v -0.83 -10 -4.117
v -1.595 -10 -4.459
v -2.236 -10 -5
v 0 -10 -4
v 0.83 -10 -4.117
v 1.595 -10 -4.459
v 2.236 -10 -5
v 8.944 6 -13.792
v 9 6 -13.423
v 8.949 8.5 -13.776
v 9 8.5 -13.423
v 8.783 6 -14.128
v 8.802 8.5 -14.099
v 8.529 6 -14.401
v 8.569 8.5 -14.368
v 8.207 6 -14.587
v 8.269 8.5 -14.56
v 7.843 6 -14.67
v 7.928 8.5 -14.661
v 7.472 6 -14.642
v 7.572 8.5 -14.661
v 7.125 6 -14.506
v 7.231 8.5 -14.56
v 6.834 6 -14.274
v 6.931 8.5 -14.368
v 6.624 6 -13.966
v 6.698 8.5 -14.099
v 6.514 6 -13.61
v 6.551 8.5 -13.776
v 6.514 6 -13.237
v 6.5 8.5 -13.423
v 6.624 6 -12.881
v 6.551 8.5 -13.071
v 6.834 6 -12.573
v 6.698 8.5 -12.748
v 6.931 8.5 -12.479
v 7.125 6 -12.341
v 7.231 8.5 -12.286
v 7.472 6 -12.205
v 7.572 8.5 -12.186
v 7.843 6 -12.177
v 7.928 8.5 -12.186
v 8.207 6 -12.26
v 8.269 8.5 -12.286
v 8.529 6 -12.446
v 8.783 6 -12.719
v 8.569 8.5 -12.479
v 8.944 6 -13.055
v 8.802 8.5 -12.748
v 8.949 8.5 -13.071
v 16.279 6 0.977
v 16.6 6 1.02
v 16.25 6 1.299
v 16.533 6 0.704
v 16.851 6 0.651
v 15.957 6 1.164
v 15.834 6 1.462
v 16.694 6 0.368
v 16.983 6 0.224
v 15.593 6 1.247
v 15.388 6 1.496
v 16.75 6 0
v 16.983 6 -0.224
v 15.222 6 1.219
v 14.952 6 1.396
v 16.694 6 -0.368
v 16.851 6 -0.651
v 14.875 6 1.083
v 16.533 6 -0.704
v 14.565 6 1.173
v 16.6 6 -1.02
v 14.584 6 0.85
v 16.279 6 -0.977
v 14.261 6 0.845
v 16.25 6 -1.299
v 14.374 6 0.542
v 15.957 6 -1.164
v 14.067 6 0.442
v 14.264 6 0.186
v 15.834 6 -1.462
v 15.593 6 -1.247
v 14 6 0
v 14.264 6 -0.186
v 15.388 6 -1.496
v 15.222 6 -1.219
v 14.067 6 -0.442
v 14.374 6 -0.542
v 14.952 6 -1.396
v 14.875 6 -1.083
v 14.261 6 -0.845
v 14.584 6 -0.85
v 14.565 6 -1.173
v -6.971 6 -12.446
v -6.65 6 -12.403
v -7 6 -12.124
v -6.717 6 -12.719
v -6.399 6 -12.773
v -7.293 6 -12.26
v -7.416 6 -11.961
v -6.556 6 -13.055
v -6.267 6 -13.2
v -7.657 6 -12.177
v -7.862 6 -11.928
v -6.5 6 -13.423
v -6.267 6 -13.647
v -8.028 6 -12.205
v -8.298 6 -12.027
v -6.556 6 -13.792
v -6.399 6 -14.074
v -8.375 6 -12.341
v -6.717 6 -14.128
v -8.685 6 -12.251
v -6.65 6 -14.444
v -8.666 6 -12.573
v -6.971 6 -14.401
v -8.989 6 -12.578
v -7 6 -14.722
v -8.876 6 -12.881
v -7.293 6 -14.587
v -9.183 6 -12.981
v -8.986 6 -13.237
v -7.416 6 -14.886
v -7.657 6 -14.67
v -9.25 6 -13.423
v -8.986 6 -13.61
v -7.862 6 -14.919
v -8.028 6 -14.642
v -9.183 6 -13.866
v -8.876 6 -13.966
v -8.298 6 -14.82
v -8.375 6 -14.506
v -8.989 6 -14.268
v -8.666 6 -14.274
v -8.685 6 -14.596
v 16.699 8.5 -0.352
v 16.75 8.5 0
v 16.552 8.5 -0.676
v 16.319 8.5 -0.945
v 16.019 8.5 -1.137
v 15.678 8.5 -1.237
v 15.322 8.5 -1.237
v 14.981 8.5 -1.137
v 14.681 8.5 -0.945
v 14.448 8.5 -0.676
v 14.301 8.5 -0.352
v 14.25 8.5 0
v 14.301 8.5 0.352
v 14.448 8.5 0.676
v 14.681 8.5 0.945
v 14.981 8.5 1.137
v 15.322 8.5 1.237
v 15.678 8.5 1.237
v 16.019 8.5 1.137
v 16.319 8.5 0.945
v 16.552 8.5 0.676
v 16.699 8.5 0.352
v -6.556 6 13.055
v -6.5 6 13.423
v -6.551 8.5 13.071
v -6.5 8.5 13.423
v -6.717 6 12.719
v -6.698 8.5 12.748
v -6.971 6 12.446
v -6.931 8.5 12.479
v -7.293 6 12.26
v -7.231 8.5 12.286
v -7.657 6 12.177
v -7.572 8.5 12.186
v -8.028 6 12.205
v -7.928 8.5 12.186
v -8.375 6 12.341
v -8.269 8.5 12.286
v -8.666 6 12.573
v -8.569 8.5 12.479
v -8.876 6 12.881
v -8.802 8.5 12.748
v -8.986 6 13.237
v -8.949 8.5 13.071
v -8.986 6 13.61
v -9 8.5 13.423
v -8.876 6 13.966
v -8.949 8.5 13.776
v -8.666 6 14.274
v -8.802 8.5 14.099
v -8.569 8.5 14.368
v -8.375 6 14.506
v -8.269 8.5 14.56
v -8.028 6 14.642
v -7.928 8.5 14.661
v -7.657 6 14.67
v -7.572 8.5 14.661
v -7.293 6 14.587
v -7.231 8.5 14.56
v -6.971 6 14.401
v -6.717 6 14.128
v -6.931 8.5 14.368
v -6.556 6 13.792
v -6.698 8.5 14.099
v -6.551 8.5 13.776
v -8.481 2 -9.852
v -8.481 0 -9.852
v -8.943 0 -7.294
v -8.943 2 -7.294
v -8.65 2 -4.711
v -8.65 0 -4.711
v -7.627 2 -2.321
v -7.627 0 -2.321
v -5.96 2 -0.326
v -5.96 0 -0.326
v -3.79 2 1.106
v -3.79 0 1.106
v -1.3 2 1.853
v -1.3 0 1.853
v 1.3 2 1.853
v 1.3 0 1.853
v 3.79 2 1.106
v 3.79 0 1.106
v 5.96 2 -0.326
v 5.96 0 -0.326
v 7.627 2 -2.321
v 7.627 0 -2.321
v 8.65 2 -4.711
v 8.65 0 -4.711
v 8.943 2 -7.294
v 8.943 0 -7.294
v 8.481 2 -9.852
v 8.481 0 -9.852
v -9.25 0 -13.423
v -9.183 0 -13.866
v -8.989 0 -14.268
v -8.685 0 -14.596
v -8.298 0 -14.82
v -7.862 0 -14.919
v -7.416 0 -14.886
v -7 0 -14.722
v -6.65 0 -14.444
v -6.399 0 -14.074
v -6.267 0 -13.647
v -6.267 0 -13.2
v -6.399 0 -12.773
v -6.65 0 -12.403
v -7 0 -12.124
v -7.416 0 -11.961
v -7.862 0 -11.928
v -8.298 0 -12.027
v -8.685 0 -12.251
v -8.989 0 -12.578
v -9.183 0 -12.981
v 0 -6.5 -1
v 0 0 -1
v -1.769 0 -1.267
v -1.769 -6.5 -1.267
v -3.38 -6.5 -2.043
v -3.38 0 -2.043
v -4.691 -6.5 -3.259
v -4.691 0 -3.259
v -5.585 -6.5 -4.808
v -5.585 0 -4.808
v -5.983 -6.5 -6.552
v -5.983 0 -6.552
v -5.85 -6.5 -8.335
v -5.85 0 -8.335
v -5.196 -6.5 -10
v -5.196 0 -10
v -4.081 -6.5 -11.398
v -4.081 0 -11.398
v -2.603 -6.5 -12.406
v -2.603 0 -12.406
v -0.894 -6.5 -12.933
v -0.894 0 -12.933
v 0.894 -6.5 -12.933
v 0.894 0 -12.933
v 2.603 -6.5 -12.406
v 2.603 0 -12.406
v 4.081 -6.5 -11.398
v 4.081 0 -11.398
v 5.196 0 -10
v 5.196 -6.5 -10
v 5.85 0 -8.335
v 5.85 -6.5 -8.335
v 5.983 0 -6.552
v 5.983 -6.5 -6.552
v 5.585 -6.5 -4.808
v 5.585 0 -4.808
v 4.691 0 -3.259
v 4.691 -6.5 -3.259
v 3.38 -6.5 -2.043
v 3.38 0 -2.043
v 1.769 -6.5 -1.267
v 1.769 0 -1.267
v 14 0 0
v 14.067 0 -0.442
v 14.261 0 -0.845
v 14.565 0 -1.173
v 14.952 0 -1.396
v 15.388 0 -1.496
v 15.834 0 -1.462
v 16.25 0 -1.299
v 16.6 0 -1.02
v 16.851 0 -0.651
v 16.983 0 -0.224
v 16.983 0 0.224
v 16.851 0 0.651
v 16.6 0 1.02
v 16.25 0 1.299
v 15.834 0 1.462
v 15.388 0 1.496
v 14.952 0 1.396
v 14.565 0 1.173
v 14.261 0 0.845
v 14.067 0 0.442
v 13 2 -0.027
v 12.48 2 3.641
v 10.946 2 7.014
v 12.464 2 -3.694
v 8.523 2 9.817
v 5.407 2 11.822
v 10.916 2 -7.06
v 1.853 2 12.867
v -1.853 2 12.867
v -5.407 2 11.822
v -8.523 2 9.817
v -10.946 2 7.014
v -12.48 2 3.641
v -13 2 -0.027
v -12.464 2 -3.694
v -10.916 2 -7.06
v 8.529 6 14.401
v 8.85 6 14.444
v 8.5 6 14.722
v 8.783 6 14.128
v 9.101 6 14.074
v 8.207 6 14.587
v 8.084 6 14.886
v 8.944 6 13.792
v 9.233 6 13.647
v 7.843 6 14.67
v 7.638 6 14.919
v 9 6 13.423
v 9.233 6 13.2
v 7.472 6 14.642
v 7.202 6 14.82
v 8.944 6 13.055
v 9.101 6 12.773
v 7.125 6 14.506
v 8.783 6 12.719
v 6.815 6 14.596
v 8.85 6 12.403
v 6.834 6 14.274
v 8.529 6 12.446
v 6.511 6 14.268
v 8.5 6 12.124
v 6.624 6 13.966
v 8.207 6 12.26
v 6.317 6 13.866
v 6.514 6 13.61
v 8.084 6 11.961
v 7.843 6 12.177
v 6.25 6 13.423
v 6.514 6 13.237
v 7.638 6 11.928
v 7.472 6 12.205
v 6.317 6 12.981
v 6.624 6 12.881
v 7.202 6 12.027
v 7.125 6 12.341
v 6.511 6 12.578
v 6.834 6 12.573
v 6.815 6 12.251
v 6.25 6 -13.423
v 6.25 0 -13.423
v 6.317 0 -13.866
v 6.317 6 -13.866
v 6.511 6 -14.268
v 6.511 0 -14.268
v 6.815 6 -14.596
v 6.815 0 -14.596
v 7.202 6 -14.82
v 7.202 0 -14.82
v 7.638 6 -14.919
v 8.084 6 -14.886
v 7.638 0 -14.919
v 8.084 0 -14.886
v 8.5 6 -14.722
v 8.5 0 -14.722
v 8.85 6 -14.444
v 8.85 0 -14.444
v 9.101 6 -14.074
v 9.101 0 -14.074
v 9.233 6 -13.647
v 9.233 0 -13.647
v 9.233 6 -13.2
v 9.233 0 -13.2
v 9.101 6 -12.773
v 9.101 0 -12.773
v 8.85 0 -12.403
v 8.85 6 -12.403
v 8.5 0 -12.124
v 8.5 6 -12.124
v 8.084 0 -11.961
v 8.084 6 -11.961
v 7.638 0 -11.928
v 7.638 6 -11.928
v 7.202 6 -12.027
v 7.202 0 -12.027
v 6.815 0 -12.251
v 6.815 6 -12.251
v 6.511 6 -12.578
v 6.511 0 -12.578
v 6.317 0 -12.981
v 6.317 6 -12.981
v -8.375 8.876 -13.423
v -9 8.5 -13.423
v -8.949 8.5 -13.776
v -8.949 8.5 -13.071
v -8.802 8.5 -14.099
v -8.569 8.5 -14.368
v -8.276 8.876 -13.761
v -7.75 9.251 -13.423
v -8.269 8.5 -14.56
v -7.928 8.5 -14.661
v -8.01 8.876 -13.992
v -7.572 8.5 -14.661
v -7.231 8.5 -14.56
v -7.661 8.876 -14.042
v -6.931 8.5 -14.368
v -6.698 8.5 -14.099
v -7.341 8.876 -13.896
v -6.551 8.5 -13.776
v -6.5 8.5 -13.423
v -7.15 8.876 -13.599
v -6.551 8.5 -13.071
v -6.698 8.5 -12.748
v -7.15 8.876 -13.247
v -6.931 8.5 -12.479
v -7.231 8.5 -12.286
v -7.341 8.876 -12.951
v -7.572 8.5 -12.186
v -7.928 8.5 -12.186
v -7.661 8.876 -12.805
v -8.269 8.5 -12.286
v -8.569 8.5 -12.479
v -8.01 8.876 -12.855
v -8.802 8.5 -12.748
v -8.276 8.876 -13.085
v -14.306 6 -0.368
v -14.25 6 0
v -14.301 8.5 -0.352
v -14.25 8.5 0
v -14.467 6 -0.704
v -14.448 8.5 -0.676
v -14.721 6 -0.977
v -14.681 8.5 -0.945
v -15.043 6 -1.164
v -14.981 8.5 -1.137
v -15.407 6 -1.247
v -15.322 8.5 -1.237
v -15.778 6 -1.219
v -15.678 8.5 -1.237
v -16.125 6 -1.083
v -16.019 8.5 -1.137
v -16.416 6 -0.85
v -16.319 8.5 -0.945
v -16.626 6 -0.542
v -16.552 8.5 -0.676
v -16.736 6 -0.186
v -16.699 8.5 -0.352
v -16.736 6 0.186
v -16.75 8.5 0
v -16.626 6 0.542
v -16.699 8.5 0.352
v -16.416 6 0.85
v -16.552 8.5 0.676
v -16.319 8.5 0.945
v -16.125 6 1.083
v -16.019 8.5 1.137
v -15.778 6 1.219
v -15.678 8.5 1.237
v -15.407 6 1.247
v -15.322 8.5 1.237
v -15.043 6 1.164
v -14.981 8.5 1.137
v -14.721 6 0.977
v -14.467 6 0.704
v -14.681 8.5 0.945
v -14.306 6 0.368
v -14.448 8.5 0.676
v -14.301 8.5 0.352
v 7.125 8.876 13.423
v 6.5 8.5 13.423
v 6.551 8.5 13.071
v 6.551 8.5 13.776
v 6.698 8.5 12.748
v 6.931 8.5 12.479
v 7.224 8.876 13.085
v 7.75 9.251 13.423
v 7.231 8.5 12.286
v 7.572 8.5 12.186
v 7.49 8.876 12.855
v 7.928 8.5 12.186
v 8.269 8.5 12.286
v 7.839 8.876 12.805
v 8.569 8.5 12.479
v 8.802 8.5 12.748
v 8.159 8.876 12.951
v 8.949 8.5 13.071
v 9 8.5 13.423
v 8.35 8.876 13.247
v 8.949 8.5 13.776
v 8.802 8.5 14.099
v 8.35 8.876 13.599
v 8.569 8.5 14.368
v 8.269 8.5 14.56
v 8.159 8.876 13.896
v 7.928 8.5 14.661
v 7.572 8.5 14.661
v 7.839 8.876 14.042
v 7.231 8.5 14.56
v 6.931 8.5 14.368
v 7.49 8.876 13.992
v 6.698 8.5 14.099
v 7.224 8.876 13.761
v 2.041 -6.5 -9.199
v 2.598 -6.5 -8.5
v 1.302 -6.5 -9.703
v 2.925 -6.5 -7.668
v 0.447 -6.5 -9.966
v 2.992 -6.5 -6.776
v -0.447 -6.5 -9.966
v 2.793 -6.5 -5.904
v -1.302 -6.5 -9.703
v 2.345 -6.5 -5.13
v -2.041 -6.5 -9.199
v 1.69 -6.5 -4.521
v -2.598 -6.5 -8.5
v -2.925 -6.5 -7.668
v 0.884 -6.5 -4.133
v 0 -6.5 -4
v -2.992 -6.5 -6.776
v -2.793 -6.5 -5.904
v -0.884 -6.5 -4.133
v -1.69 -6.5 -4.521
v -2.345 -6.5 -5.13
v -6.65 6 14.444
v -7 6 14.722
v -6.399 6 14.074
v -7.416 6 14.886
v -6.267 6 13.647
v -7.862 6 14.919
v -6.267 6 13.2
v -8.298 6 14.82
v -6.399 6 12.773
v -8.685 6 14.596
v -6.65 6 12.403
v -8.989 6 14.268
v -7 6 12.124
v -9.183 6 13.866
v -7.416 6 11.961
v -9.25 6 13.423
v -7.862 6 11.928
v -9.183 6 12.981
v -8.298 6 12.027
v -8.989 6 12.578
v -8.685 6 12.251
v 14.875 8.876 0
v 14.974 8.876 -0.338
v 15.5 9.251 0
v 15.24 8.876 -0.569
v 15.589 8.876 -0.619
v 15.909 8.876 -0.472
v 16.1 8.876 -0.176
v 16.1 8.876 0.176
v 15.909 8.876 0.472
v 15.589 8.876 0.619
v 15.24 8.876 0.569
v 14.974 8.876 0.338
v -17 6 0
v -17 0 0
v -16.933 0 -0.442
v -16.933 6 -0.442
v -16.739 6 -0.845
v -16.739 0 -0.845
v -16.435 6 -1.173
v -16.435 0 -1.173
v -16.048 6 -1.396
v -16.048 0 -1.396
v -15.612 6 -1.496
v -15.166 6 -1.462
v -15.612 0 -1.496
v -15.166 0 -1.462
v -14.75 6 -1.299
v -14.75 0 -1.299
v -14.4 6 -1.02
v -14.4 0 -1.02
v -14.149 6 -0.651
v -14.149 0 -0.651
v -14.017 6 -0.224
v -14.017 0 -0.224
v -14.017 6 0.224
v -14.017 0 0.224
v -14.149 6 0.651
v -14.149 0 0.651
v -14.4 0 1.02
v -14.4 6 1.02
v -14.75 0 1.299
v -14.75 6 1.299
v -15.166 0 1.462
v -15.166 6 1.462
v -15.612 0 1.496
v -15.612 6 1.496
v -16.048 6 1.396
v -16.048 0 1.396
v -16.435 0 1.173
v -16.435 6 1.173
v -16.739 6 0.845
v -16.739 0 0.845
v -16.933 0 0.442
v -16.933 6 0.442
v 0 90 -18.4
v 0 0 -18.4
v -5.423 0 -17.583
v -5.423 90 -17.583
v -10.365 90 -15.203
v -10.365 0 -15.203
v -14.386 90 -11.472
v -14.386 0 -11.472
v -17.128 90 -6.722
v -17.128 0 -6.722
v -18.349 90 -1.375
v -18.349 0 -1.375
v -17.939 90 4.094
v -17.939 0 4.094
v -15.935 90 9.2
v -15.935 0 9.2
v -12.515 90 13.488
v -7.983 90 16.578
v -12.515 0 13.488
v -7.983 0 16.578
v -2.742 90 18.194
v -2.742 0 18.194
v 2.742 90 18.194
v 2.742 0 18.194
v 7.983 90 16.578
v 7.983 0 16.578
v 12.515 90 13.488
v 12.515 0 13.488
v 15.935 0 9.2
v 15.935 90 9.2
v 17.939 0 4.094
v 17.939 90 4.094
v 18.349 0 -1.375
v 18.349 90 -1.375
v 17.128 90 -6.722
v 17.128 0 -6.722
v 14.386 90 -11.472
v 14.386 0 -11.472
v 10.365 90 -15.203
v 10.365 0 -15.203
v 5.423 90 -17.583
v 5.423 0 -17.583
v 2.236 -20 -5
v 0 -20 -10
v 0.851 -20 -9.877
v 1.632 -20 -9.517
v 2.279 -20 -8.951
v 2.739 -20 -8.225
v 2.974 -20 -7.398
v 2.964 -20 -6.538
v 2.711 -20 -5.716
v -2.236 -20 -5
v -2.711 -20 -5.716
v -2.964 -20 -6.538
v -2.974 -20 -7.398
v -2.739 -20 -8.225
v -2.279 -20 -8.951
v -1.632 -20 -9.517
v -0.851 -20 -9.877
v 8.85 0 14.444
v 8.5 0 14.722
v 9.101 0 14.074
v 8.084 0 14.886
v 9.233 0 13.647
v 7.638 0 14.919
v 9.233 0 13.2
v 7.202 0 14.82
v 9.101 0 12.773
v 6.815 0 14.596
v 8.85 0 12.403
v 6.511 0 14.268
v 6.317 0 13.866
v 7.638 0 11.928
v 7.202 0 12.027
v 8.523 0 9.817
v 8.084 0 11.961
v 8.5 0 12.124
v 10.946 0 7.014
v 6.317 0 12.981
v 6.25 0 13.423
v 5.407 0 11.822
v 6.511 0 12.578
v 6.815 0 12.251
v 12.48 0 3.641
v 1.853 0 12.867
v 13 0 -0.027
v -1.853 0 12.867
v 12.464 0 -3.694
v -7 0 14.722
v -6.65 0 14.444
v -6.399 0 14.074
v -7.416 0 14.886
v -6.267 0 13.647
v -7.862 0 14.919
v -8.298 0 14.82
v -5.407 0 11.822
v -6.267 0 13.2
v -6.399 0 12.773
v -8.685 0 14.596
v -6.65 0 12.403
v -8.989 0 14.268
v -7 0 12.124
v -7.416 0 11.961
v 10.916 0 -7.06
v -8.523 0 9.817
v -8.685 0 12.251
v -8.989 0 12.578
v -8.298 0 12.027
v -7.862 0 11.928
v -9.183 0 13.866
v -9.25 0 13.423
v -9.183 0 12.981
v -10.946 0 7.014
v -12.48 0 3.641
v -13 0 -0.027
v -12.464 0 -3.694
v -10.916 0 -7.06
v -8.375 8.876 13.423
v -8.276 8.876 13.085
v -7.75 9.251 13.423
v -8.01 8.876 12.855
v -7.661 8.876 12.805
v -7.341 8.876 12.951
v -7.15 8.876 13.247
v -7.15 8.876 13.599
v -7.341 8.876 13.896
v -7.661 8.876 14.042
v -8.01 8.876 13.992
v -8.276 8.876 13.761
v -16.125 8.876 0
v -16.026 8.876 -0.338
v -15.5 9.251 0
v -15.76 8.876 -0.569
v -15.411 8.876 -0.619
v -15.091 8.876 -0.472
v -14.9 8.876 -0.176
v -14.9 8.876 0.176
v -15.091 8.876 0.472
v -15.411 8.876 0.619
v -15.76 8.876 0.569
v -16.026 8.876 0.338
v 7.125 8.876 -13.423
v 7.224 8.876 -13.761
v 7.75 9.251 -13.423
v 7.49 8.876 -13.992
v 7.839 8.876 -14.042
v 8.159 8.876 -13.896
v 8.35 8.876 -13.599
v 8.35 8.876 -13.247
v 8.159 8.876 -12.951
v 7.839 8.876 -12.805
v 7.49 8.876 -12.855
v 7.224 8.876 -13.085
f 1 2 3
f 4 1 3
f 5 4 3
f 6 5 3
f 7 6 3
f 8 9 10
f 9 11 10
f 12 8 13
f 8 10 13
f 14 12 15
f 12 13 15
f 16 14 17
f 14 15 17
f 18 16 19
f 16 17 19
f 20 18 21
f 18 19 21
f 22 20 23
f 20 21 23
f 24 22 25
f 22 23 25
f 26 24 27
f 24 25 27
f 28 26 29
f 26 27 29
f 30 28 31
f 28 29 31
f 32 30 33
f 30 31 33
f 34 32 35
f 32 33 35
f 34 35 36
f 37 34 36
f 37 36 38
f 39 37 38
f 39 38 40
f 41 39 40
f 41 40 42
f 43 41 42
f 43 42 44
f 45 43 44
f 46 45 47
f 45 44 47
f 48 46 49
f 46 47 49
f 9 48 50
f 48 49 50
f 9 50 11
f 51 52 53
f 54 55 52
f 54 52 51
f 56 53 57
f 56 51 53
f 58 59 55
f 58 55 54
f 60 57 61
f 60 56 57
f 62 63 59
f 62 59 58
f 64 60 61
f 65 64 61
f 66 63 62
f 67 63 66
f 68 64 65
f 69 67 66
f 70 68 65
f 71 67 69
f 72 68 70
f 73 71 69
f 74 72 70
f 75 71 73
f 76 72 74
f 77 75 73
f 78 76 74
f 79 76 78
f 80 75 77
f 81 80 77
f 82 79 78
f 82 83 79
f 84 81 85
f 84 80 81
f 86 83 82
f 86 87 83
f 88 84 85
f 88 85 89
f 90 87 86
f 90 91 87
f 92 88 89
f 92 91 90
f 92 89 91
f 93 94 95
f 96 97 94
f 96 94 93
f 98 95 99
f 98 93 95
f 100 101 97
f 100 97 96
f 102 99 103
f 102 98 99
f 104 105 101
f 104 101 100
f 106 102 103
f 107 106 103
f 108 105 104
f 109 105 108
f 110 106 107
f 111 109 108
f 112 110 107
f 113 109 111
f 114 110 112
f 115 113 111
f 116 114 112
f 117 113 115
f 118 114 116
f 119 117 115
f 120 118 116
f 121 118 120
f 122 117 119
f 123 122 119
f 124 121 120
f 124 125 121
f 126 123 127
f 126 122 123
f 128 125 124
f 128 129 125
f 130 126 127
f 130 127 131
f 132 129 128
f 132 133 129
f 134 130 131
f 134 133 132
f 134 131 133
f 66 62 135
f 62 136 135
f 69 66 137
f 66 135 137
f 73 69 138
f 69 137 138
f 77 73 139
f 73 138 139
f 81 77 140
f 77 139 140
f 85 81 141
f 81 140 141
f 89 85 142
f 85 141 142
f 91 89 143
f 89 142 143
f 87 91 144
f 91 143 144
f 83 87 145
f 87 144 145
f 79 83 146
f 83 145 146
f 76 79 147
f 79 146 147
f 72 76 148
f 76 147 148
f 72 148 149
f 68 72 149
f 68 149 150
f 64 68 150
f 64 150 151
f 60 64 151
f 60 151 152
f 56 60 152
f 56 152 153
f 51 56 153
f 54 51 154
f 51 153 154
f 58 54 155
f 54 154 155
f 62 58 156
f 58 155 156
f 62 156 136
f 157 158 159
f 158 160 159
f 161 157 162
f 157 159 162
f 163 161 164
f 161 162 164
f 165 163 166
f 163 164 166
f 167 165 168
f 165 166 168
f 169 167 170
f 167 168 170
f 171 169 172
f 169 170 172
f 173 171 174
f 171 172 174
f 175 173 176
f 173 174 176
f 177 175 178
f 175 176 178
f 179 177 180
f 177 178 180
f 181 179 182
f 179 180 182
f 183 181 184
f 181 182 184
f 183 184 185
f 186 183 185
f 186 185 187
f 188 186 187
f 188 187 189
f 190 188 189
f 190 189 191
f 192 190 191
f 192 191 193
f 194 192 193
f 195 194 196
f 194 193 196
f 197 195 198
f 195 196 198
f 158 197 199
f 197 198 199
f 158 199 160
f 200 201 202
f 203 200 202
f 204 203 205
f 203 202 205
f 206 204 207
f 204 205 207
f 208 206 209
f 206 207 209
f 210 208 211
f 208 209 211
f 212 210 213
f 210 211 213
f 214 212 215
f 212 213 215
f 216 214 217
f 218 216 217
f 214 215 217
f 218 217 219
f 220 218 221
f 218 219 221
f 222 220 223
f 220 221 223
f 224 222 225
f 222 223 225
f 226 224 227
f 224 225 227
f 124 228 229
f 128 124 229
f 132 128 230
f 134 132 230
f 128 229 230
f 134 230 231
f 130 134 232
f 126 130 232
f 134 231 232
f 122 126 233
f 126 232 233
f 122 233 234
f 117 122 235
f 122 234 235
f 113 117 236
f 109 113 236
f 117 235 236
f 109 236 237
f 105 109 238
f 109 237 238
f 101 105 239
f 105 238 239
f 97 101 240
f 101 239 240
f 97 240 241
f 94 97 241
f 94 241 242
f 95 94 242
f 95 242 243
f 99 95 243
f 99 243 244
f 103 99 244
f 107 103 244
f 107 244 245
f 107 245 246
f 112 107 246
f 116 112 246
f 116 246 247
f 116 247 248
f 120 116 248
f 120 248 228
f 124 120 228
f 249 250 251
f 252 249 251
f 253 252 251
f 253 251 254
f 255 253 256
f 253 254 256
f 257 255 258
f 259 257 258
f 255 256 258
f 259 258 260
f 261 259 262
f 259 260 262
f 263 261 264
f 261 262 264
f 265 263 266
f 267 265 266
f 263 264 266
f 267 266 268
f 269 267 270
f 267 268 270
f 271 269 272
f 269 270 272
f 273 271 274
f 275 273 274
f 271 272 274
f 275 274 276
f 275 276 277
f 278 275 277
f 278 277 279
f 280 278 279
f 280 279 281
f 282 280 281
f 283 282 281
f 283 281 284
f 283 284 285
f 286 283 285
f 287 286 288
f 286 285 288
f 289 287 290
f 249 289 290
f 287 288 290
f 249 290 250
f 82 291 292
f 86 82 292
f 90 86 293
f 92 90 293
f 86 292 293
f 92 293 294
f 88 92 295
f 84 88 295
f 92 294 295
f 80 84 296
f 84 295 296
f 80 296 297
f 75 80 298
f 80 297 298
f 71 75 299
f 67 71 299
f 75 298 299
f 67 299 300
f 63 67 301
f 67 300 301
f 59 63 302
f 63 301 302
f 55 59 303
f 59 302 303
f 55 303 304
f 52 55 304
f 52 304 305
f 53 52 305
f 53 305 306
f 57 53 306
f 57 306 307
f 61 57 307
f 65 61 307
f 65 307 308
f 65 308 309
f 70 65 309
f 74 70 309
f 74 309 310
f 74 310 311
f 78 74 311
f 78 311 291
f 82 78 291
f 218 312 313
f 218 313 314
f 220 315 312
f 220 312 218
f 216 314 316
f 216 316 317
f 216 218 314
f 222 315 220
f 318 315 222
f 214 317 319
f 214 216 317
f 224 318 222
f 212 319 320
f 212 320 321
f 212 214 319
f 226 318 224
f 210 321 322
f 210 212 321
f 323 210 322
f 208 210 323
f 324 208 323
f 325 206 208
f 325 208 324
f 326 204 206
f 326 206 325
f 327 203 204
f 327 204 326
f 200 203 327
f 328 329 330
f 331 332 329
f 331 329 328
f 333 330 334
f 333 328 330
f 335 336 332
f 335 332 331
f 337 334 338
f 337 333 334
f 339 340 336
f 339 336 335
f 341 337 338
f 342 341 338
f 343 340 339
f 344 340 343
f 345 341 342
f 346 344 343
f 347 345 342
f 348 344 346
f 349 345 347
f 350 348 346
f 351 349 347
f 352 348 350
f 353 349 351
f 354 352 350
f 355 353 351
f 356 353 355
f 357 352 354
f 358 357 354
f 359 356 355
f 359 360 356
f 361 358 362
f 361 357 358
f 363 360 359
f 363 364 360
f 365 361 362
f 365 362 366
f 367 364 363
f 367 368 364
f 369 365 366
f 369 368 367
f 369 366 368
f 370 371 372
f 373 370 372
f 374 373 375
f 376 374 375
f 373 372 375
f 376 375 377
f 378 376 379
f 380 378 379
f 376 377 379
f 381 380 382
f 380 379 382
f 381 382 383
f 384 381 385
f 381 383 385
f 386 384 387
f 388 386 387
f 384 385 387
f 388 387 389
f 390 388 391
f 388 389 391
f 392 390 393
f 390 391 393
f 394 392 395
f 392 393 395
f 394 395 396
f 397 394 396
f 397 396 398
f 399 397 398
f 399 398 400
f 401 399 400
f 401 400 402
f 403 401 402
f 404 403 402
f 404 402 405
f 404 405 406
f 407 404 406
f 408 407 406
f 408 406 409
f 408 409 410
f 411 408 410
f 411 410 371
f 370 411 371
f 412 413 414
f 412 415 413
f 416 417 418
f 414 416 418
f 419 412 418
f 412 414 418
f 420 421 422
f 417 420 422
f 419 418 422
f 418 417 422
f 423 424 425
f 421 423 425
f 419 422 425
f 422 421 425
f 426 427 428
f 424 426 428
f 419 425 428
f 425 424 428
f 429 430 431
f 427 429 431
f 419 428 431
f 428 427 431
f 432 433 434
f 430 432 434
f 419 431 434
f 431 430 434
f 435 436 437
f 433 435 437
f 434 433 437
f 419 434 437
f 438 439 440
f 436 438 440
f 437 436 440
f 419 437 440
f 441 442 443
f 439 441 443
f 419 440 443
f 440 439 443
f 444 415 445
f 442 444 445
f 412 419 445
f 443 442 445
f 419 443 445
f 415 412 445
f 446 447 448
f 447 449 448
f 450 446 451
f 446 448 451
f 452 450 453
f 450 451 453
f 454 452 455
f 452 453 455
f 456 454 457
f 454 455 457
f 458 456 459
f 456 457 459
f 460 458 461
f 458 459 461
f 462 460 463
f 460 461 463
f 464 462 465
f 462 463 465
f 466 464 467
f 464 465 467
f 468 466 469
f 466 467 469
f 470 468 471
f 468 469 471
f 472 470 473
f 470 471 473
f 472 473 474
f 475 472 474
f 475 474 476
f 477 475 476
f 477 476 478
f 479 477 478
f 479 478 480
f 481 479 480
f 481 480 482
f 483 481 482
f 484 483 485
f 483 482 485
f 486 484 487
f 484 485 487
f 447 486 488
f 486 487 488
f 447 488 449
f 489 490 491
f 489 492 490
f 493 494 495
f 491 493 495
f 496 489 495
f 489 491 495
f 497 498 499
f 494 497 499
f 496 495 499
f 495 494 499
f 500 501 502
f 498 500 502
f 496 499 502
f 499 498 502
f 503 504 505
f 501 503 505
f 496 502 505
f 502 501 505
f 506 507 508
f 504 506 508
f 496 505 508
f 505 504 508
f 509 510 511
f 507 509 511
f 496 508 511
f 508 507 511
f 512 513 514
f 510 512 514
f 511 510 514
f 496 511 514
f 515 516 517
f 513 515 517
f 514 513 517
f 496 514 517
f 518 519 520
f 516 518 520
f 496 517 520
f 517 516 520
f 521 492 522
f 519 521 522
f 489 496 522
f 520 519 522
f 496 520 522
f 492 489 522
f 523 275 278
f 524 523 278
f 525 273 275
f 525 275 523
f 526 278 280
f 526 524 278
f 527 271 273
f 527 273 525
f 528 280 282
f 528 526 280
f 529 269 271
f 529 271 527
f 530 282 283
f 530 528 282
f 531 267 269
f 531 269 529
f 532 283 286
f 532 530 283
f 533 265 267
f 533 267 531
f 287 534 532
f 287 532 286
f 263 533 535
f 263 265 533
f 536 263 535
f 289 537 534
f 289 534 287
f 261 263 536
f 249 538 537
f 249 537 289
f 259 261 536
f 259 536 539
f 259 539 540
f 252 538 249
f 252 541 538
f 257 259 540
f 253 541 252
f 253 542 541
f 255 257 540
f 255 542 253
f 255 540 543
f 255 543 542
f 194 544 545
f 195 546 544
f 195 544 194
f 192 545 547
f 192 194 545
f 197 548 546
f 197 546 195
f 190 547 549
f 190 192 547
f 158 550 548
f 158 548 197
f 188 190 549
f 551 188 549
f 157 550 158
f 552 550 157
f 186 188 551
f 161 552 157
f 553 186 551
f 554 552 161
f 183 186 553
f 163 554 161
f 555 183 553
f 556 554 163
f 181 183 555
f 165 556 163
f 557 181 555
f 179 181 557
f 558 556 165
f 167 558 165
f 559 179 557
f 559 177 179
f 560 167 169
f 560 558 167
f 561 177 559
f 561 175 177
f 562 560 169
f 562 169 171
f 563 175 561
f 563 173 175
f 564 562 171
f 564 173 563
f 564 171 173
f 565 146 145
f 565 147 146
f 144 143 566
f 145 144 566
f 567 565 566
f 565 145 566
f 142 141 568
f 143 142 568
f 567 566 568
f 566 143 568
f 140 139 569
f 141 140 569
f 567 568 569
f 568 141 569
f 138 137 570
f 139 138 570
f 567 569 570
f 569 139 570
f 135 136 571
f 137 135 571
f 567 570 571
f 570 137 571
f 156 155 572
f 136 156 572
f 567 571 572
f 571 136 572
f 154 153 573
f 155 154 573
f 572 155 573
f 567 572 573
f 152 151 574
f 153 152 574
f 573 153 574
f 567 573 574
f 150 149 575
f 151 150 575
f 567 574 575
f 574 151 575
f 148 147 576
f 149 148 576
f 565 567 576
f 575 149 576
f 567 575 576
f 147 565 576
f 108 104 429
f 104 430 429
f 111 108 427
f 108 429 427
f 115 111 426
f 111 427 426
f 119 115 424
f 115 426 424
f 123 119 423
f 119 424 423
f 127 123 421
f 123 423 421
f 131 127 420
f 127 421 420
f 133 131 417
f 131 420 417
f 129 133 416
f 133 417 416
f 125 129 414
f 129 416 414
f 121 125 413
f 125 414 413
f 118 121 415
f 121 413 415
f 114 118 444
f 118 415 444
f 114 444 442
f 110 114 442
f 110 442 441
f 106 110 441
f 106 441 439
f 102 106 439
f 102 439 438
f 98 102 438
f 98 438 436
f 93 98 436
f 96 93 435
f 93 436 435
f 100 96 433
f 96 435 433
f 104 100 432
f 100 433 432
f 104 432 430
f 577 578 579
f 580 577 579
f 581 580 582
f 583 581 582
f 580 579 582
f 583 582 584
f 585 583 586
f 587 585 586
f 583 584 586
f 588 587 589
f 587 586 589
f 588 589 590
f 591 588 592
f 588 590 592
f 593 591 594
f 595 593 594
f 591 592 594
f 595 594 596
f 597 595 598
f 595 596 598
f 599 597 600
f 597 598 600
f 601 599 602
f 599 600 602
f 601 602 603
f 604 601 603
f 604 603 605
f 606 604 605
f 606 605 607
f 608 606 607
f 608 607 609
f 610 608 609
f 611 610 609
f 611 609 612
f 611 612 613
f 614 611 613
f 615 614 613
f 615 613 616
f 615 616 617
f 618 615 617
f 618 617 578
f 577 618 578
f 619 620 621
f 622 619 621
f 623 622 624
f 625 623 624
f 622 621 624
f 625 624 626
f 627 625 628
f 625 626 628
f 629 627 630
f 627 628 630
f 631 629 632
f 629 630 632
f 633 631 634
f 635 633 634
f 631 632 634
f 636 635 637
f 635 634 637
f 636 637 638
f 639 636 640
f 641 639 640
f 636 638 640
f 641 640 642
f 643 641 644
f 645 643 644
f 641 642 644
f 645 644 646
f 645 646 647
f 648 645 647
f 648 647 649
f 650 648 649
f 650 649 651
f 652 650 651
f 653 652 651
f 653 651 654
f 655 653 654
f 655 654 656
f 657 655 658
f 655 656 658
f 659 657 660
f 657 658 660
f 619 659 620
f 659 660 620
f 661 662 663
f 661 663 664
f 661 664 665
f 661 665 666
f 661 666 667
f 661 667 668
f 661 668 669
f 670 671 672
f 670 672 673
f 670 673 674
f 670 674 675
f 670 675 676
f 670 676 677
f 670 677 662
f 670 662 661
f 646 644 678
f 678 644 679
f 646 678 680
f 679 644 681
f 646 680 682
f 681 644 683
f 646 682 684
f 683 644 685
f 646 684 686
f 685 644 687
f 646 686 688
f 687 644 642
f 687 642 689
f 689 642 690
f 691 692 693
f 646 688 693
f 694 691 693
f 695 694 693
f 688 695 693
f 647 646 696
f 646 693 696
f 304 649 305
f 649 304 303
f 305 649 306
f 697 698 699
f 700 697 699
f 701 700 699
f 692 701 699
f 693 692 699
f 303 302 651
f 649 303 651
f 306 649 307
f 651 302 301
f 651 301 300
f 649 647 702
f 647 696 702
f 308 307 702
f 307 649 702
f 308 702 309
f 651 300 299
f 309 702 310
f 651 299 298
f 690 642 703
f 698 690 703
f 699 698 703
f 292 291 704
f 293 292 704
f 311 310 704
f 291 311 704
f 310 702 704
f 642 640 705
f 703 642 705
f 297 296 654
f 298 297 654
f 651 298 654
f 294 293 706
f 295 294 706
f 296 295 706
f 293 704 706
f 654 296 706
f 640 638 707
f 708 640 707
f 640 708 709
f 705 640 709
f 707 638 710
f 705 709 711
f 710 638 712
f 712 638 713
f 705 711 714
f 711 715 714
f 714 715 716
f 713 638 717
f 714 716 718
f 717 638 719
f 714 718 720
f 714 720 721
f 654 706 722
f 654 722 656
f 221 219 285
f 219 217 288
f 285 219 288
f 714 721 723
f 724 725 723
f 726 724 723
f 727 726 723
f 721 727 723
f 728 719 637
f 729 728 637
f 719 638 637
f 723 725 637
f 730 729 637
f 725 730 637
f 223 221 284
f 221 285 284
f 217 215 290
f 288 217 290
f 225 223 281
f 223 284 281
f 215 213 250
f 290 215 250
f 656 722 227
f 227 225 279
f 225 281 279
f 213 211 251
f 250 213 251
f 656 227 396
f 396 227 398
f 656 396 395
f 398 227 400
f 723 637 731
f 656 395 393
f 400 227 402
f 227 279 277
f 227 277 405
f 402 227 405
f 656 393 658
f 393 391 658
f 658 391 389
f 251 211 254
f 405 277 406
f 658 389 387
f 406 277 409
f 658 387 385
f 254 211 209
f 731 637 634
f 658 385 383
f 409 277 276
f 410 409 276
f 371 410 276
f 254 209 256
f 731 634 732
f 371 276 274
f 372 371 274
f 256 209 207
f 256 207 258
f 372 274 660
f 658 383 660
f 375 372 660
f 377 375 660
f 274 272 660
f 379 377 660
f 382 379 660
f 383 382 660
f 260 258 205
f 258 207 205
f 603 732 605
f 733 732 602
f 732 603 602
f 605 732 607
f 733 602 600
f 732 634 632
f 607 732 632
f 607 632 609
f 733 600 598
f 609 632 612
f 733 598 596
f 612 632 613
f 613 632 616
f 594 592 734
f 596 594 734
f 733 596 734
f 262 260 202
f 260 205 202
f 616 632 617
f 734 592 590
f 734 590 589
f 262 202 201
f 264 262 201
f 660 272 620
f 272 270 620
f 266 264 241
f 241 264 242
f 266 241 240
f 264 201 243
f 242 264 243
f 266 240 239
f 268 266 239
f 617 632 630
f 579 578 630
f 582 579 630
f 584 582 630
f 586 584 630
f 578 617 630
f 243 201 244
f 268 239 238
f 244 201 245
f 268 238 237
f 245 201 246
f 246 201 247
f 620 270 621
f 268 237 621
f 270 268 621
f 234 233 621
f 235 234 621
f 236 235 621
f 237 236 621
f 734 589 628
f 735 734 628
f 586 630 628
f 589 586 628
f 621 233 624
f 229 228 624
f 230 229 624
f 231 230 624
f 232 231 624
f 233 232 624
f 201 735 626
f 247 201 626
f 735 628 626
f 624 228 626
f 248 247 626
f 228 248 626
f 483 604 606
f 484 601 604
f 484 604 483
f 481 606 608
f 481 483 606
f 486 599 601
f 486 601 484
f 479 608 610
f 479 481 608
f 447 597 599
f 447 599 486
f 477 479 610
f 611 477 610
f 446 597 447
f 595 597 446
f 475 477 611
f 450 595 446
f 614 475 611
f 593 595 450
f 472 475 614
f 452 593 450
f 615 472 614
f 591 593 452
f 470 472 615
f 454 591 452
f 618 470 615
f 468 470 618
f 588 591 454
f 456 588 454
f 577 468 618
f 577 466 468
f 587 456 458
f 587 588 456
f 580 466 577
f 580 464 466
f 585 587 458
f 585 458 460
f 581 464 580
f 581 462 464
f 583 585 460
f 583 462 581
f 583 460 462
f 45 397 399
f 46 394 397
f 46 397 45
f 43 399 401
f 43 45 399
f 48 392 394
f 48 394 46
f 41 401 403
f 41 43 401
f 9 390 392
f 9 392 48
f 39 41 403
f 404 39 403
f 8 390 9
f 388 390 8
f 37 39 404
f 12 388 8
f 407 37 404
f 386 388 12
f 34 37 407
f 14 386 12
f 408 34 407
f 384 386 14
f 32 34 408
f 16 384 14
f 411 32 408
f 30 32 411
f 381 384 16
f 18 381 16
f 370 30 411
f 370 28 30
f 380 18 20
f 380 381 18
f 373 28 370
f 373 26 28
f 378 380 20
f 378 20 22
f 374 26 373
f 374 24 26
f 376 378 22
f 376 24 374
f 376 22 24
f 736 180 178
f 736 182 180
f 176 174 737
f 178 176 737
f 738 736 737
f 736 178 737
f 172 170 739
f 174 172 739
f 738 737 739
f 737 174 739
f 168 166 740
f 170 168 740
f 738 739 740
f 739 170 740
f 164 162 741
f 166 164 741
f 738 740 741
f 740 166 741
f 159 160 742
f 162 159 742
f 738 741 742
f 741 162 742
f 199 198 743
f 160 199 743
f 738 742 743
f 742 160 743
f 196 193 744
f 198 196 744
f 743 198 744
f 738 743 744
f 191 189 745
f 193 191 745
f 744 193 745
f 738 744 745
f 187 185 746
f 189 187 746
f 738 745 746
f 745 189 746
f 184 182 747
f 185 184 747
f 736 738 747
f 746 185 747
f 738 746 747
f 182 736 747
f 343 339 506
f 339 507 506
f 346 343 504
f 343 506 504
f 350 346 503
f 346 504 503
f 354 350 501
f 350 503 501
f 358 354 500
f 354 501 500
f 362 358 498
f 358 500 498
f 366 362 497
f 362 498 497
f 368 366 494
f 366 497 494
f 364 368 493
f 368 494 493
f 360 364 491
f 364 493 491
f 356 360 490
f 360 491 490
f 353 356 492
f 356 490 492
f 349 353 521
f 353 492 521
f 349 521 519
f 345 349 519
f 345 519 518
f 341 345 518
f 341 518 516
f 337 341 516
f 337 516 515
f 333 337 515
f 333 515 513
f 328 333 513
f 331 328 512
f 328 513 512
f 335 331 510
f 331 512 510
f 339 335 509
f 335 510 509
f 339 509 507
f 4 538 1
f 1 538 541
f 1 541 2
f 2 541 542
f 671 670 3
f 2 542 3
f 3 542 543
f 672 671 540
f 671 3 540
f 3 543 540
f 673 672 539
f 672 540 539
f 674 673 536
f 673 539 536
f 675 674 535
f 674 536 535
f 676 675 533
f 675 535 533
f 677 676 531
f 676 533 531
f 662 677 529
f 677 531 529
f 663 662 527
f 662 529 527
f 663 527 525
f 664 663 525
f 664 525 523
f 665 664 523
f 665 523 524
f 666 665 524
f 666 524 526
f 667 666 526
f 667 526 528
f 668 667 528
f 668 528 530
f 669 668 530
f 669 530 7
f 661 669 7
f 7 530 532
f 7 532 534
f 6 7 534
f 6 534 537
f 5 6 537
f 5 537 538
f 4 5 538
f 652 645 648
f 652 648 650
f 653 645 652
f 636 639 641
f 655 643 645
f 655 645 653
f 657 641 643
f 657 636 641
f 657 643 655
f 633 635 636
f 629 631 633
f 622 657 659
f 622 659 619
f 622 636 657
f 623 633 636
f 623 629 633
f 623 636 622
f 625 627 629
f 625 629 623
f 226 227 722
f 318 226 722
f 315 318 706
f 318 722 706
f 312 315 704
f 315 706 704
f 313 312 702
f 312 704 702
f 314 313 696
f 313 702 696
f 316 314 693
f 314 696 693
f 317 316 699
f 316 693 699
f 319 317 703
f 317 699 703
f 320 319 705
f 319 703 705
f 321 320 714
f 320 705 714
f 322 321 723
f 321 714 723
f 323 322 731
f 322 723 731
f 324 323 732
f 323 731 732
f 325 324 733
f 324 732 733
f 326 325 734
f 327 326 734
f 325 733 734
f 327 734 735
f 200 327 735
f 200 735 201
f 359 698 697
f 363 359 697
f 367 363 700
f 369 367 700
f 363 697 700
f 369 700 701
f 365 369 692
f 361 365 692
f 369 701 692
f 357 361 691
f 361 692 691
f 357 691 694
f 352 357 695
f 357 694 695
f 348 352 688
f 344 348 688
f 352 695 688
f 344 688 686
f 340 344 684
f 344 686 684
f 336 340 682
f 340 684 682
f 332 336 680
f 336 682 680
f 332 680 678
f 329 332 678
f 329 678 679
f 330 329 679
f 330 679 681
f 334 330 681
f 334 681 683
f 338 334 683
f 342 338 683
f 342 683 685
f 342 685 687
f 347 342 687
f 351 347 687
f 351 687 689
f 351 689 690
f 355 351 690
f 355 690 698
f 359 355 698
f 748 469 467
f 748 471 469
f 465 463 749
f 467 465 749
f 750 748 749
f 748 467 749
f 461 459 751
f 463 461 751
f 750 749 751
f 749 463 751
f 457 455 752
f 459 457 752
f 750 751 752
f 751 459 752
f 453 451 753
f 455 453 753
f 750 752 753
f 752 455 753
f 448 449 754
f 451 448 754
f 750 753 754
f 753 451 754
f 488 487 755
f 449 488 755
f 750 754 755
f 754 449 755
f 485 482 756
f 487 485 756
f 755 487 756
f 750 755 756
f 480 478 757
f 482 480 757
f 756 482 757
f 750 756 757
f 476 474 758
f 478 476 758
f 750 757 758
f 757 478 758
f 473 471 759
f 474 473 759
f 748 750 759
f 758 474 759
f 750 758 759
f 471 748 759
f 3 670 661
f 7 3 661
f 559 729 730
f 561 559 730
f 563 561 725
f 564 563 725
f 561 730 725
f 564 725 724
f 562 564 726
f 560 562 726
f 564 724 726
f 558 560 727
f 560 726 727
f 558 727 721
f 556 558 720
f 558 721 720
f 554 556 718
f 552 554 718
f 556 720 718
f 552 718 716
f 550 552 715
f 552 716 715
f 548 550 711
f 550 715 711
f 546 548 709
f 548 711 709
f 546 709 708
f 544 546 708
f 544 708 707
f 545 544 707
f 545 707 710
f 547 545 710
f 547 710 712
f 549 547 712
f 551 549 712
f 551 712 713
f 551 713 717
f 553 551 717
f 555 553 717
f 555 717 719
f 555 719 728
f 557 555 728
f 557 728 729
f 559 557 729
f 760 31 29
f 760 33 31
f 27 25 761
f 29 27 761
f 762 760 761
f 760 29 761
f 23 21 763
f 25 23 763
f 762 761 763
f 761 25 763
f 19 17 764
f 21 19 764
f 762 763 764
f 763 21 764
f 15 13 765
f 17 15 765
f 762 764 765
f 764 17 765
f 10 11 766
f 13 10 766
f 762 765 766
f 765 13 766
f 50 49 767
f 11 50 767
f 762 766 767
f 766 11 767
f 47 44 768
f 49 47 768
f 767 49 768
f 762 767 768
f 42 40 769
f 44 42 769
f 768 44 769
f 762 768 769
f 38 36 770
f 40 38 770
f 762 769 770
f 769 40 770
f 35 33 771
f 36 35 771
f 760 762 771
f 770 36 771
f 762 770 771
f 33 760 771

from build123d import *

# Parameters (mm, degrees)
CROQUIS1_R                          = 18.4
SALIENTE_EXTRUIR1_DEPTH             = 90
CROQUIS2_R                          = 3
SALIENTE_EXTRUIR2_DEPTH             = 20
TALADRO_ROSCADO_M3X0_51_D           = 2.5
TALADRO_ROSCADO_M3X0_51_DEPTH       = 8.5
TALADRO_ROSCADO_M3X0_51_CBORE_D     = 3
TALADRO_ROSCADO_M3X0_51_CBORE_DEPTH = 6
TALADRO_ROSCADO_M3X0_51_TIP         = 0.751075774
CROQUIS7_R                          = 6
SALIENTE_EXTRUIR3_DEPTH             = 6.5
CORTAR_EXTRUIR1_DEPTH               = 2
CROQUIS9_W                          = 4.472135954
CROQUIS9_H                          = 10.231682496
CORTAR_EXTRUIR2_DEPTH               = 10


with BuildPart() as part:
    # Croquis1 → Saliente-Extruir1 (new body)
    with BuildSketch(Plane(origin=(0, 0, 0), x_dir=(1, 0, 0), z_dir=(0, 1, 0))):
        with Locations(Location((0, 0, 0), (0, 0, 90))):
            Circle(CROQUIS1_R)
    extrude(amount=SALIENTE_EXTRUIR1_DEPTH)

    # Croquis2 → Saliente-Extruir2 (add)
    with BuildSketch(Plane(origin=(0, 0, 0), x_dir=(-1, 0, 0), z_dir=(0, -1, 0))):
        with Locations(Location((0, 7, 0), (0, 0, 270))):
            Circle(CROQUIS2_R)
    extrude(amount=SALIENTE_EXTRUIR2_DEPTH)

    # Taladro roscado M3x0.51
    with Locations(Plane(origin=(0, 0, 0), x_dir=(-1, 0, 0), z_dir=(0, -1, 0))):
        with Locations((-7.75, -13.423393759), (-15.5, 0), (-7.75, 13.423393759), (7.75, 13.423393759), (15.5, 0), (7.75, -13.423393759)):
            CounterBoreHole(TALADRO_ROSCADO_M3X0_51_D / 2, TALADRO_ROSCADO_M3X0_51_CBORE_D / 2, TALADRO_ROSCADO_M3X0_51_CBORE_DEPTH, depth=TALADRO_ROSCADO_M3X0_51_DEPTH)
            with Locations((0, 0, -(TALADRO_ROSCADO_M3X0_51_DEPTH + TALADRO_ROSCADO_M3X0_51_TIP / 2))):  # 118° drill point
                Cone(0, TALADRO_ROSCADO_M3X0_51_D / 2, TALADRO_ROSCADO_M3X0_51_TIP, mode=Mode.SUBTRACT)

    # Croquis7 → Saliente-Extruir3 (add)
    with BuildSketch(Plane(origin=(0, 0, 0), x_dir=(-1, 0, 0), z_dir=(0, -1, 0))):
        with Locations(Location((0, 7, 0), (0, 0, 270))):
            Circle(CROQUIS7_R)
    extrude(amount=SALIENTE_EXTRUIR3_DEPTH)

    # Croquis8 → Cortar-Extruir1 (cut)
    with BuildSketch(Plane(origin=(0, 0, 0), x_dir=(-1, 0, 0), z_dir=(0, -1, 0))):
        with BuildLine():
            ThreePointArc((-8.481146613, 9.852418593), (0, -13), (8.481146613, 9.852418593))
            ThreePointArc((8.481146613, 9.852418593), (0, -1.947968468), (-8.481146613, 9.852418593))
        make_face()
    extrude(amount=-CORTAR_EXTRUIR1_DEPTH, mode=Mode.SUBTRACT)

    # Croquis9 → Cortar-Extruir2 (cut)
    with BuildSketch(Plane.XZ.offset(20)):
        with Locations((0, 0.115841248)):
            Rectangle(CROQUIS9_W, CROQUIS9_H)
    extrude(amount=-CORTAR_EXTRUIR2_DEPTH, mode=Mode.SUBTRACT)


solid = part.part
